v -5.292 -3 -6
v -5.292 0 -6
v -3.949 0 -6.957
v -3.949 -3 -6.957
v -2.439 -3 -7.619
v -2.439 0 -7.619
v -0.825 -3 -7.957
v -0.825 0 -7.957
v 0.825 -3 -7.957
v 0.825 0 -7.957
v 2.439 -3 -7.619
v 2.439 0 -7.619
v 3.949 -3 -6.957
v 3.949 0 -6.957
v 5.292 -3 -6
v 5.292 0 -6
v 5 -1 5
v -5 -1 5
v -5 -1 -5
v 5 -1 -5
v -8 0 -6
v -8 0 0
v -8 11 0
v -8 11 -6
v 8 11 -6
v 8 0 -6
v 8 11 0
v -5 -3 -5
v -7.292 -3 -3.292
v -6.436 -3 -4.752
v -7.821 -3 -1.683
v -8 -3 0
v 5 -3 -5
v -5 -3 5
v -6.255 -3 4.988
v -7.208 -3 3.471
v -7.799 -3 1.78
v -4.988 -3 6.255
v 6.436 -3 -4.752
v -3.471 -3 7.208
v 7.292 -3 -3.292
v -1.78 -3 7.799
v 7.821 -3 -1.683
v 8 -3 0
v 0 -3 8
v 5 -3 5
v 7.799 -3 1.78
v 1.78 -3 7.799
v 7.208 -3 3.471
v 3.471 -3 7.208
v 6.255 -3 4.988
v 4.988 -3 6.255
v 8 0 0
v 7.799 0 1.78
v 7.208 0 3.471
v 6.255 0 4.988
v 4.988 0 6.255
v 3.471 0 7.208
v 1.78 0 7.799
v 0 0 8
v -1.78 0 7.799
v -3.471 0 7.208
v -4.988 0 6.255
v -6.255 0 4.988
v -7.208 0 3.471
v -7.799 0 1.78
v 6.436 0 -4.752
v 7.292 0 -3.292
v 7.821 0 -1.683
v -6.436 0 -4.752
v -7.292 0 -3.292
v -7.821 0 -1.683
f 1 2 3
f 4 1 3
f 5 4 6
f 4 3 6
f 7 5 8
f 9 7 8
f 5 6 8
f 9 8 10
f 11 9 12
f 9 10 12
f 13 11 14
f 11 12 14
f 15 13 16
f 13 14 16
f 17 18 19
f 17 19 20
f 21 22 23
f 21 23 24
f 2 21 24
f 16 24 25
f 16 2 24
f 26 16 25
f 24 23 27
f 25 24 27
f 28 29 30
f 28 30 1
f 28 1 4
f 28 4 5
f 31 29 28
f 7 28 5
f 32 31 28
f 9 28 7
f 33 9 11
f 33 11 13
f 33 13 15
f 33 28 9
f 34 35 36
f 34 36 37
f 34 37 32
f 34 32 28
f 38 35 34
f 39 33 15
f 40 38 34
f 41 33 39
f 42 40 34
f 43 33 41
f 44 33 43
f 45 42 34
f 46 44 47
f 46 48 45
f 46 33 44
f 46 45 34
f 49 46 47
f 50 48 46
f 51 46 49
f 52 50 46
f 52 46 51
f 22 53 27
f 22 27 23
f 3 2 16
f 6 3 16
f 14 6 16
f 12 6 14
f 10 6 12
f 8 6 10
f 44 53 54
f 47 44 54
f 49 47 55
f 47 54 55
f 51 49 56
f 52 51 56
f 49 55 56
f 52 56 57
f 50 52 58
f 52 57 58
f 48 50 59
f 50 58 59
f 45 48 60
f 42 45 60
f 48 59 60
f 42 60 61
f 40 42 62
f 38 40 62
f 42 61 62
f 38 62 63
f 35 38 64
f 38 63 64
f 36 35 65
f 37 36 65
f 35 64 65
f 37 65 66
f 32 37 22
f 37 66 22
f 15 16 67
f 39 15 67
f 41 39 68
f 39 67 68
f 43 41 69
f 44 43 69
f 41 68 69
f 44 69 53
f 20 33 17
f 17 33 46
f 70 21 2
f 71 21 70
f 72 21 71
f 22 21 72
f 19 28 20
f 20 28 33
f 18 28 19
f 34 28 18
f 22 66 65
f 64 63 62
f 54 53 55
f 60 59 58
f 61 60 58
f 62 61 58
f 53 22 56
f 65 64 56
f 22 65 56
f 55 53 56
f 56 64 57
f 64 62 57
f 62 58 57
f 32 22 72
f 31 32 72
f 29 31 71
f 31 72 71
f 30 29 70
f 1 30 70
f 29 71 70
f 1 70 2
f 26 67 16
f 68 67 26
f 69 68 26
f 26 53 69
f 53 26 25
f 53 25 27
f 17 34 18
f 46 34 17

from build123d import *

# Parameters (mm, degrees)
F1_DEPTH = 11
F2_DEPTH = 3
F3_W     = 10
F3_H     = 10
F4_DEPTH = 2


with BuildPart() as f1:
    # F0 (on Front) → F1 (new body)
    with BuildSketch(Plane.XZ):
        with BuildLine():
            ThreePointArc((-5.2915026221, -6), (-7.2915026221, -3.2915026221), (-8, 0))
            Line((-8, 0), (-8, -6))
            Line((-8, -6), (-5.2915026221, -6))
        make_face()
        with BuildLine():
            Line((8, -6), (8, 0))
            ThreePointArc((8, 0), (7.2915026221, -3.2915026221), (5.2915026221, -6))
            Line((5.2915026221, -6), (8, -6))
        make_face()
        with BuildLine():
            ThreePointArc((5.2915026221, -6), (7.2915026221, -3.2915026221), (8, 0))
            Line((8, 0), (-8, 0))
            ThreePointArc((-8, 0), (-7.2915026221, -3.2915026221), (-5.2915026221, -6))
            Line((-5.2915026221, -6), (5.2915026221, -6))
        make_face()
    extrude(amount=-F1_DEPTH)

    # F0 (on Front) → F2 (join)
    with BuildSketch(Plane.XZ):
        with BuildLine():
            Line((-8, 0), (8, 0))
            ThreePointArc((8, 0), (0, 8), (-8, 0))
        make_face()
        with BuildLine():
            ThreePointArc((5.2915026221, -6), (7.2915026221, -3.2915026221), (8, 0))
            Line((8, 0), (-8, 0))
            ThreePointArc((-8, 0), (-7.2915026221, -3.2915026221), (-5.2915026221, -6))
            Line((-5.2915026221, -6), (5.2915026221, -6))
        make_face()
        with BuildLine():
            ThreePointArc((-5.2915026221, -6), (0, -8), (5.2915026221, -6))
            Line((5.2915026221, -6), (-5.2915026221, -6))
        make_face()
    extrude(amount=F2_DEPTH)

    # F3 (on face) → F4 (cut)
    with BuildSketch(Plane.XZ.offset(3)):
        Rectangle(F3_W, F3_H)
    extrude(amount=-F4_DEPTH, mode=Mode.SUBTRACT)


solid = f1.part
